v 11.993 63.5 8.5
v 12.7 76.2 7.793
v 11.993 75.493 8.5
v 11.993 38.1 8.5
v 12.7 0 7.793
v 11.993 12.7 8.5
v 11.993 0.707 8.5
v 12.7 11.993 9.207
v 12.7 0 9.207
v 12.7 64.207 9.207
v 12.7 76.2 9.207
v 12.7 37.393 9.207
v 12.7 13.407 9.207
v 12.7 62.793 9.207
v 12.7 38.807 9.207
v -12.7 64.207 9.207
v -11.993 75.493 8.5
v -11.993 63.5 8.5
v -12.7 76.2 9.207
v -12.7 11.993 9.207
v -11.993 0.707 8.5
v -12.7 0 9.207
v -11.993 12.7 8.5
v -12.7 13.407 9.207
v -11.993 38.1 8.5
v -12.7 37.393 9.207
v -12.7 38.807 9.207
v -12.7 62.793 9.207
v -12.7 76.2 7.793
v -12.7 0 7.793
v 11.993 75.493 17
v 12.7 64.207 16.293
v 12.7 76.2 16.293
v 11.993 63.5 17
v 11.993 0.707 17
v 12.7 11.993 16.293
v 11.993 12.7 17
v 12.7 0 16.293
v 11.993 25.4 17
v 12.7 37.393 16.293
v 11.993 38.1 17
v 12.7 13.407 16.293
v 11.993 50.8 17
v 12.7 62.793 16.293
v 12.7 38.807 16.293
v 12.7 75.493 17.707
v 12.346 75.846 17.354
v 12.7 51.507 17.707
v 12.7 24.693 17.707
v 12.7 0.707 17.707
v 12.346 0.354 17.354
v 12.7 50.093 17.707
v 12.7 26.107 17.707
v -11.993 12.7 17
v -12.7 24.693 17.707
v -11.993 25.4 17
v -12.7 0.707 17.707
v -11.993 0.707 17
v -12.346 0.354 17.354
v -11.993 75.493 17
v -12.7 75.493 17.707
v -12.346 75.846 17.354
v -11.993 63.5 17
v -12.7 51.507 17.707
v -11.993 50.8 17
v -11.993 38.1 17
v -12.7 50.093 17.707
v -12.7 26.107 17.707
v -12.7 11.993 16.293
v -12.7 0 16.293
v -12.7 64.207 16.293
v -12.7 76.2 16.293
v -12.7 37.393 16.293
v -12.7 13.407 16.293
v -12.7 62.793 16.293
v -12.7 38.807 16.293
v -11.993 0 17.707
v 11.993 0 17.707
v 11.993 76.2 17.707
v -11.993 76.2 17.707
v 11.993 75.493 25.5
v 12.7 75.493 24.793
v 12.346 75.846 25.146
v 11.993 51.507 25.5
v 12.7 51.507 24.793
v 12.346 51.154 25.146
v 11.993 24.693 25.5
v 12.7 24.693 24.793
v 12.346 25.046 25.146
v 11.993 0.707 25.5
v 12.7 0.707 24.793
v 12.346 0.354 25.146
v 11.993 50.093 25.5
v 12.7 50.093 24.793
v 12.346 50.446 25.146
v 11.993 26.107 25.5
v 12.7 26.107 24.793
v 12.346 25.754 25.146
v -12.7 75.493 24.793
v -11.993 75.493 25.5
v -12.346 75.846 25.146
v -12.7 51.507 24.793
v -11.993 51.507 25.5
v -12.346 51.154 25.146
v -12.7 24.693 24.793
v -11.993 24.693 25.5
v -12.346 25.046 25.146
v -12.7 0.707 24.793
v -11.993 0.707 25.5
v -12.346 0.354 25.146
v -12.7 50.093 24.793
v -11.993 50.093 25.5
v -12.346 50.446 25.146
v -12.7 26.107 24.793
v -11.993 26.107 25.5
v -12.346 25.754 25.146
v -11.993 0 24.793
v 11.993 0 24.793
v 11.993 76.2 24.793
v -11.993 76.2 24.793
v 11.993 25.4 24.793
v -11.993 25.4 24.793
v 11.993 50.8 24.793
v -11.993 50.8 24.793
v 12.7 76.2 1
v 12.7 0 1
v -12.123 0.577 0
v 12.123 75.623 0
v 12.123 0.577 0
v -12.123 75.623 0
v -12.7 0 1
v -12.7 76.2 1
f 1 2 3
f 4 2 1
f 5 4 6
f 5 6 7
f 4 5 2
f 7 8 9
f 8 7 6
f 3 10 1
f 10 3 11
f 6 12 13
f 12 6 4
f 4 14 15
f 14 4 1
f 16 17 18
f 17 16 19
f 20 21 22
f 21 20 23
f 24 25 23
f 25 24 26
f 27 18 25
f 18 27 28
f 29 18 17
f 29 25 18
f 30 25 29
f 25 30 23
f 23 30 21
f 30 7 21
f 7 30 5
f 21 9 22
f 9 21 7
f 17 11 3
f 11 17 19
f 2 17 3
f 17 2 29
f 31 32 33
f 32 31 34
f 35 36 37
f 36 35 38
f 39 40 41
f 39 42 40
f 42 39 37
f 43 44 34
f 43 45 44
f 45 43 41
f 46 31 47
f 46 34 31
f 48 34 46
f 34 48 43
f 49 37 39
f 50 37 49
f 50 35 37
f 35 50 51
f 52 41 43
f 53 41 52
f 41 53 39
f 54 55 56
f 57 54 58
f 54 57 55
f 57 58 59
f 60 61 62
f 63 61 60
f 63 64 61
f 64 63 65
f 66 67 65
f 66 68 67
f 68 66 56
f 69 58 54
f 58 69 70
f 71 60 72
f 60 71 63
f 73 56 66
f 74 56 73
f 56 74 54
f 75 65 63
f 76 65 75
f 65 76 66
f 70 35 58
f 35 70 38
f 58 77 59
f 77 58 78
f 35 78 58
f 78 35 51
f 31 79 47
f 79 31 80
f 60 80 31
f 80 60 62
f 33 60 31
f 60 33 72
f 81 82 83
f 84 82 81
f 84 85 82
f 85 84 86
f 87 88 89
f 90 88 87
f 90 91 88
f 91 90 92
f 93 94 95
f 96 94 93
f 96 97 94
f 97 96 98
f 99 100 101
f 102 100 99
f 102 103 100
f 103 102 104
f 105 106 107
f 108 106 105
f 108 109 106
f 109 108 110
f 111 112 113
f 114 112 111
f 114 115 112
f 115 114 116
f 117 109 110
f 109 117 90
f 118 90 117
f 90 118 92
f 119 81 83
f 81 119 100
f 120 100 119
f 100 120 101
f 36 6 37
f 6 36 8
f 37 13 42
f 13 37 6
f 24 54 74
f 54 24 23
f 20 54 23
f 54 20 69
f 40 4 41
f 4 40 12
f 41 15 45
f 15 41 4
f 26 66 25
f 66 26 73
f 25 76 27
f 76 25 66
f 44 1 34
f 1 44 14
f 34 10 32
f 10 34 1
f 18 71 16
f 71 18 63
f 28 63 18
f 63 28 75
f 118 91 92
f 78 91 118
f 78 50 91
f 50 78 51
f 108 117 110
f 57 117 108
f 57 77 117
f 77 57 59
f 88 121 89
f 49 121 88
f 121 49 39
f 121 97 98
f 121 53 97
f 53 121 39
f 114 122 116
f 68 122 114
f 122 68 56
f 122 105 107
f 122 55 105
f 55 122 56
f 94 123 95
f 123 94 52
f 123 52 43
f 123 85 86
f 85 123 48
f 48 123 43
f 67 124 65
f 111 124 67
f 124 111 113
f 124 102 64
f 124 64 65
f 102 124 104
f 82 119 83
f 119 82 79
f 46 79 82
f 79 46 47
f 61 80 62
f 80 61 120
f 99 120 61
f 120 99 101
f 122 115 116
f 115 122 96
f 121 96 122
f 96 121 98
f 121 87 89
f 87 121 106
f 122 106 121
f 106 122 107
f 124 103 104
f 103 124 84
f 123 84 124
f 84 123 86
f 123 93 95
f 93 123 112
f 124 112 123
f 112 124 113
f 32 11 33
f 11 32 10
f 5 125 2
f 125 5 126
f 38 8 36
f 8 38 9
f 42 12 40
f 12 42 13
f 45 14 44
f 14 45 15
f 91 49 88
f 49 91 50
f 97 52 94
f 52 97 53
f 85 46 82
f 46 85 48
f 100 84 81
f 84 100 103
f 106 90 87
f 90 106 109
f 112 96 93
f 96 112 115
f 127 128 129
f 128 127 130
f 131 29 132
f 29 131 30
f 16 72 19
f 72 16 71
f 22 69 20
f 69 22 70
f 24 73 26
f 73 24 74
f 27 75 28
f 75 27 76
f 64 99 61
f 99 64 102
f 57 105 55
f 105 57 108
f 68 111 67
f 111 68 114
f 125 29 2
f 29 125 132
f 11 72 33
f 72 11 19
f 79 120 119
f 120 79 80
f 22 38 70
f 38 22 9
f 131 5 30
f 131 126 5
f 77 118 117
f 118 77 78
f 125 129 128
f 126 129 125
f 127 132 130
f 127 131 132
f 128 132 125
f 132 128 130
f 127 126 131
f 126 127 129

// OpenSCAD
thickness=8.5;
tilex=6;
tiley=3;
inch=25.4;
groove=1;


//wall
    difference()
    {
        translate([0,tiley*inch/2,thickness*1.5])cube([inch,tiley*inch,thickness*3],center=true);
        
        pocks=floor(rands(0,(tiley)*1,1)[0]);
        //pocks=0;
        //echo (pocks);
        for (ii=[0:pocks])
        {
            shapenum = floor(rands(0,16,1)[0])+1;
            echo(shapenum);
            angle=floor(rands(0,360,1)[0])+1;
            xx=-1*(thickness*2+inch/2)+((thickness*4+inch))*(rands(0,1,1)[0]); //total area is the top (inch/2) and the wall (2 thicknesses)
            yy=inch*(rands(0,tiley,1)[0]);
            zz1=(inch/2+thickness*3)-xx;  //pivot is going to be the total area, minus how far we've gone so far (xx)
            zz2=xx+(inch/2+thickness*3);
            translate([xx,yy,thickness*3])rotate([0,0,angle])blemish(shapenum);
            translate([inch/2,yy,zz1])rotate([0,90,0])rotate([0,0,angle])blemish(shapenum);
            translate([-inch/2,yy,zz2])rotate([0,-90,0])rotate([0,0,angle])blemish(shapenum);
        }
        for (ii=[0:2])//horizontal lines
        {
            translate([inch/2,tiley*inch/2,thickness*1+(ii*thickness)])rotate([0,45,0])cube([groove,tiley*inch*2,groove],center=true);
            
            translate([-inch/2,tiley*inch/2,thickness*1+(ii*thickness)])rotate([0,45,0])cube([groove,tiley*inch*2,groove],center=true);
            translate([0,0,thickness*1+(ii*thickness)])rotate([45,0,0])cube([inch*2,groove,groove],center=true);
            translate([0,inch*tiley,thickness*1+(ii*thickness)])rotate([45,0,0])cube([inch*2,groove,groove],center=true);
        }
        for (ii=[0:tiley])
            //middle row
        {
            translate([inch/2,inch*ii+inch/2,thickness+thickness*.5])rotate([0,0,45])cube([groove,groove,thickness],center=true);
            translate([-inch/2,inch*ii+inch/2,thickness+thickness*.5])rotate([0,0,45])cube([groove,groove,thickness],center=true);
        }
        for (ii=[0:tiley])
        {
            //top row
            translate([inch/2,inch*ii,thickness*2+thickness*.5])rotate([0,0,45])cube([groove,groove,thickness],center=true);
            translate([-inch/2,inch*ii,thickness*2+thickness*.5])rotate([0,0,45])cube([groove,groove,thickness],center=true);
        }
        for (ii=[0:tiley])
        {
            //top grooves
            translate([0,inch*ii,thickness*3])rotate([45,0,0])cube([inch*2,groove,groove],center=true);
        }

        translate([inch/2,tiley*inch/2,0])rotate([0,30,0])cube([groove,tiley*inch*2,groove*2],center=true);
        translate([-inch/2,tiley*inch/2,0])rotate([0,60,0])cube([groove*2,tiley*inch*2,groove],center=true);
        translate([tilex*inch/2,tiley*inch,0])rotate([60,0,0])cube([tilex*inch*2,groove*2,groove],center=true);
        translate([tilex*inch/2,0,0])rotate([30,0,0])cube([tilex*inch*2,groove,groove*2],center=true);
        
    }

module selectshape(shapenum)
{
    
    if (shapenum==1){ shape01(); }
    if (shapenum==2){ shape02(); }
    if (shapenum==3){ shape03(); }
    if (shapenum==4){ shape04(); }
    if (shapenum==5){ shape05(); }
    if (shapenum==6){ shape06(); }
    if (shapenum==7){ shape07(); }
    if (shapenum==8){ shape08(); }
    if (shapenum==9){ shape09(); }
    if (shapenum==10){ shape10(); }
    if (shapenum==11){ shape11(); }
    if (shapenum==12){ shape12(); }
    if (shapenum==13){ shape13(); }
    if (shapenum==14){ shape14(); }
    if (shapenum==15){ shape15(); }
    if (shapenum==16){ shape16(); }
}
module blemish(shapenum)
{
    
    {
        translate([0,0,-.5])linear_extrude(height=.101)selectshape(shapenum);
        translate([0,0,-.4])linear_extrude(height=.101)minkowski(){selectshape(shapenum); circle(r=.1);}
        translate([0,0,-.3])linear_extrude(height=.101)minkowski(){selectshape(shapenum); circle(r=.2);}
        translate([0,0,-.2])linear_extrude(height=.101)minkowski(){selectshape(shapenum); circle(r=.3);}
        translate([0,0,-.1])linear_extrude(height=.101)minkowski(){selectshape(shapenum); circle(r=.4);}
    }
}
module shape01()
{
    translate([-3,-2])scale(.8)import("blemish/shape001.dxf");
}
module shape02()
{
    translate([-3,-2])scale(.8)import("blemish/shape002.dxf");
}
module shape03()
{
    translate([-3,-2,0])scale(.8)import("blemish/shape003.dxf");
}
module shape04()
{
    translate([-14,-18,0])scale(.8)import("blemish/shape004.dxf");
}
module shape05()
{
    translate([-13,-10,0])scale(.8)import("blemish/shape005.dxf");
}
module shape06()
{
    translate([-2,-4,0])scale(.32)import("blemish/shape006.dxf");
}
module shape07()
{
    translate([-9,-9,0])scale(.3)import("blemish/shape007.dxf");
}
module shape08()
{
    translate([-6,-12,0])scale(.6)import("blemish/shape008.dxf");
}
module shape09()
{
    translate([-2,-2,0])scale(.2)import("blemish/shape009.dxf");
}
module shape10()
{
    translate([-1,-3,0])scale(.1)import("blemish/shape010.dxf");
}
module shape11()
{
    translate([-2,-4,0])scale(.3)import("blemish/shape011.dxf");
}
module shape12()
{
    translate([-6,-2,0])scale(.6)import("blemish/shape012.dxf");
}
module shape13()
{
    translate([-9,-14,0])scale(.7)import("blemish/shape013.dxf");
}
module shape14()
{
    translate([-0.5,-1,0])scale(.1)import("blemish/shape014.dxf");
}
module shape15()
{
    translate([-.5,-.5,0])scale(.1)import("blemish/shape015.dxf");
}
module shape16()
{
    translate([-6,-6,0])scale(.5)import("blemish/shape016.dxf");
}
